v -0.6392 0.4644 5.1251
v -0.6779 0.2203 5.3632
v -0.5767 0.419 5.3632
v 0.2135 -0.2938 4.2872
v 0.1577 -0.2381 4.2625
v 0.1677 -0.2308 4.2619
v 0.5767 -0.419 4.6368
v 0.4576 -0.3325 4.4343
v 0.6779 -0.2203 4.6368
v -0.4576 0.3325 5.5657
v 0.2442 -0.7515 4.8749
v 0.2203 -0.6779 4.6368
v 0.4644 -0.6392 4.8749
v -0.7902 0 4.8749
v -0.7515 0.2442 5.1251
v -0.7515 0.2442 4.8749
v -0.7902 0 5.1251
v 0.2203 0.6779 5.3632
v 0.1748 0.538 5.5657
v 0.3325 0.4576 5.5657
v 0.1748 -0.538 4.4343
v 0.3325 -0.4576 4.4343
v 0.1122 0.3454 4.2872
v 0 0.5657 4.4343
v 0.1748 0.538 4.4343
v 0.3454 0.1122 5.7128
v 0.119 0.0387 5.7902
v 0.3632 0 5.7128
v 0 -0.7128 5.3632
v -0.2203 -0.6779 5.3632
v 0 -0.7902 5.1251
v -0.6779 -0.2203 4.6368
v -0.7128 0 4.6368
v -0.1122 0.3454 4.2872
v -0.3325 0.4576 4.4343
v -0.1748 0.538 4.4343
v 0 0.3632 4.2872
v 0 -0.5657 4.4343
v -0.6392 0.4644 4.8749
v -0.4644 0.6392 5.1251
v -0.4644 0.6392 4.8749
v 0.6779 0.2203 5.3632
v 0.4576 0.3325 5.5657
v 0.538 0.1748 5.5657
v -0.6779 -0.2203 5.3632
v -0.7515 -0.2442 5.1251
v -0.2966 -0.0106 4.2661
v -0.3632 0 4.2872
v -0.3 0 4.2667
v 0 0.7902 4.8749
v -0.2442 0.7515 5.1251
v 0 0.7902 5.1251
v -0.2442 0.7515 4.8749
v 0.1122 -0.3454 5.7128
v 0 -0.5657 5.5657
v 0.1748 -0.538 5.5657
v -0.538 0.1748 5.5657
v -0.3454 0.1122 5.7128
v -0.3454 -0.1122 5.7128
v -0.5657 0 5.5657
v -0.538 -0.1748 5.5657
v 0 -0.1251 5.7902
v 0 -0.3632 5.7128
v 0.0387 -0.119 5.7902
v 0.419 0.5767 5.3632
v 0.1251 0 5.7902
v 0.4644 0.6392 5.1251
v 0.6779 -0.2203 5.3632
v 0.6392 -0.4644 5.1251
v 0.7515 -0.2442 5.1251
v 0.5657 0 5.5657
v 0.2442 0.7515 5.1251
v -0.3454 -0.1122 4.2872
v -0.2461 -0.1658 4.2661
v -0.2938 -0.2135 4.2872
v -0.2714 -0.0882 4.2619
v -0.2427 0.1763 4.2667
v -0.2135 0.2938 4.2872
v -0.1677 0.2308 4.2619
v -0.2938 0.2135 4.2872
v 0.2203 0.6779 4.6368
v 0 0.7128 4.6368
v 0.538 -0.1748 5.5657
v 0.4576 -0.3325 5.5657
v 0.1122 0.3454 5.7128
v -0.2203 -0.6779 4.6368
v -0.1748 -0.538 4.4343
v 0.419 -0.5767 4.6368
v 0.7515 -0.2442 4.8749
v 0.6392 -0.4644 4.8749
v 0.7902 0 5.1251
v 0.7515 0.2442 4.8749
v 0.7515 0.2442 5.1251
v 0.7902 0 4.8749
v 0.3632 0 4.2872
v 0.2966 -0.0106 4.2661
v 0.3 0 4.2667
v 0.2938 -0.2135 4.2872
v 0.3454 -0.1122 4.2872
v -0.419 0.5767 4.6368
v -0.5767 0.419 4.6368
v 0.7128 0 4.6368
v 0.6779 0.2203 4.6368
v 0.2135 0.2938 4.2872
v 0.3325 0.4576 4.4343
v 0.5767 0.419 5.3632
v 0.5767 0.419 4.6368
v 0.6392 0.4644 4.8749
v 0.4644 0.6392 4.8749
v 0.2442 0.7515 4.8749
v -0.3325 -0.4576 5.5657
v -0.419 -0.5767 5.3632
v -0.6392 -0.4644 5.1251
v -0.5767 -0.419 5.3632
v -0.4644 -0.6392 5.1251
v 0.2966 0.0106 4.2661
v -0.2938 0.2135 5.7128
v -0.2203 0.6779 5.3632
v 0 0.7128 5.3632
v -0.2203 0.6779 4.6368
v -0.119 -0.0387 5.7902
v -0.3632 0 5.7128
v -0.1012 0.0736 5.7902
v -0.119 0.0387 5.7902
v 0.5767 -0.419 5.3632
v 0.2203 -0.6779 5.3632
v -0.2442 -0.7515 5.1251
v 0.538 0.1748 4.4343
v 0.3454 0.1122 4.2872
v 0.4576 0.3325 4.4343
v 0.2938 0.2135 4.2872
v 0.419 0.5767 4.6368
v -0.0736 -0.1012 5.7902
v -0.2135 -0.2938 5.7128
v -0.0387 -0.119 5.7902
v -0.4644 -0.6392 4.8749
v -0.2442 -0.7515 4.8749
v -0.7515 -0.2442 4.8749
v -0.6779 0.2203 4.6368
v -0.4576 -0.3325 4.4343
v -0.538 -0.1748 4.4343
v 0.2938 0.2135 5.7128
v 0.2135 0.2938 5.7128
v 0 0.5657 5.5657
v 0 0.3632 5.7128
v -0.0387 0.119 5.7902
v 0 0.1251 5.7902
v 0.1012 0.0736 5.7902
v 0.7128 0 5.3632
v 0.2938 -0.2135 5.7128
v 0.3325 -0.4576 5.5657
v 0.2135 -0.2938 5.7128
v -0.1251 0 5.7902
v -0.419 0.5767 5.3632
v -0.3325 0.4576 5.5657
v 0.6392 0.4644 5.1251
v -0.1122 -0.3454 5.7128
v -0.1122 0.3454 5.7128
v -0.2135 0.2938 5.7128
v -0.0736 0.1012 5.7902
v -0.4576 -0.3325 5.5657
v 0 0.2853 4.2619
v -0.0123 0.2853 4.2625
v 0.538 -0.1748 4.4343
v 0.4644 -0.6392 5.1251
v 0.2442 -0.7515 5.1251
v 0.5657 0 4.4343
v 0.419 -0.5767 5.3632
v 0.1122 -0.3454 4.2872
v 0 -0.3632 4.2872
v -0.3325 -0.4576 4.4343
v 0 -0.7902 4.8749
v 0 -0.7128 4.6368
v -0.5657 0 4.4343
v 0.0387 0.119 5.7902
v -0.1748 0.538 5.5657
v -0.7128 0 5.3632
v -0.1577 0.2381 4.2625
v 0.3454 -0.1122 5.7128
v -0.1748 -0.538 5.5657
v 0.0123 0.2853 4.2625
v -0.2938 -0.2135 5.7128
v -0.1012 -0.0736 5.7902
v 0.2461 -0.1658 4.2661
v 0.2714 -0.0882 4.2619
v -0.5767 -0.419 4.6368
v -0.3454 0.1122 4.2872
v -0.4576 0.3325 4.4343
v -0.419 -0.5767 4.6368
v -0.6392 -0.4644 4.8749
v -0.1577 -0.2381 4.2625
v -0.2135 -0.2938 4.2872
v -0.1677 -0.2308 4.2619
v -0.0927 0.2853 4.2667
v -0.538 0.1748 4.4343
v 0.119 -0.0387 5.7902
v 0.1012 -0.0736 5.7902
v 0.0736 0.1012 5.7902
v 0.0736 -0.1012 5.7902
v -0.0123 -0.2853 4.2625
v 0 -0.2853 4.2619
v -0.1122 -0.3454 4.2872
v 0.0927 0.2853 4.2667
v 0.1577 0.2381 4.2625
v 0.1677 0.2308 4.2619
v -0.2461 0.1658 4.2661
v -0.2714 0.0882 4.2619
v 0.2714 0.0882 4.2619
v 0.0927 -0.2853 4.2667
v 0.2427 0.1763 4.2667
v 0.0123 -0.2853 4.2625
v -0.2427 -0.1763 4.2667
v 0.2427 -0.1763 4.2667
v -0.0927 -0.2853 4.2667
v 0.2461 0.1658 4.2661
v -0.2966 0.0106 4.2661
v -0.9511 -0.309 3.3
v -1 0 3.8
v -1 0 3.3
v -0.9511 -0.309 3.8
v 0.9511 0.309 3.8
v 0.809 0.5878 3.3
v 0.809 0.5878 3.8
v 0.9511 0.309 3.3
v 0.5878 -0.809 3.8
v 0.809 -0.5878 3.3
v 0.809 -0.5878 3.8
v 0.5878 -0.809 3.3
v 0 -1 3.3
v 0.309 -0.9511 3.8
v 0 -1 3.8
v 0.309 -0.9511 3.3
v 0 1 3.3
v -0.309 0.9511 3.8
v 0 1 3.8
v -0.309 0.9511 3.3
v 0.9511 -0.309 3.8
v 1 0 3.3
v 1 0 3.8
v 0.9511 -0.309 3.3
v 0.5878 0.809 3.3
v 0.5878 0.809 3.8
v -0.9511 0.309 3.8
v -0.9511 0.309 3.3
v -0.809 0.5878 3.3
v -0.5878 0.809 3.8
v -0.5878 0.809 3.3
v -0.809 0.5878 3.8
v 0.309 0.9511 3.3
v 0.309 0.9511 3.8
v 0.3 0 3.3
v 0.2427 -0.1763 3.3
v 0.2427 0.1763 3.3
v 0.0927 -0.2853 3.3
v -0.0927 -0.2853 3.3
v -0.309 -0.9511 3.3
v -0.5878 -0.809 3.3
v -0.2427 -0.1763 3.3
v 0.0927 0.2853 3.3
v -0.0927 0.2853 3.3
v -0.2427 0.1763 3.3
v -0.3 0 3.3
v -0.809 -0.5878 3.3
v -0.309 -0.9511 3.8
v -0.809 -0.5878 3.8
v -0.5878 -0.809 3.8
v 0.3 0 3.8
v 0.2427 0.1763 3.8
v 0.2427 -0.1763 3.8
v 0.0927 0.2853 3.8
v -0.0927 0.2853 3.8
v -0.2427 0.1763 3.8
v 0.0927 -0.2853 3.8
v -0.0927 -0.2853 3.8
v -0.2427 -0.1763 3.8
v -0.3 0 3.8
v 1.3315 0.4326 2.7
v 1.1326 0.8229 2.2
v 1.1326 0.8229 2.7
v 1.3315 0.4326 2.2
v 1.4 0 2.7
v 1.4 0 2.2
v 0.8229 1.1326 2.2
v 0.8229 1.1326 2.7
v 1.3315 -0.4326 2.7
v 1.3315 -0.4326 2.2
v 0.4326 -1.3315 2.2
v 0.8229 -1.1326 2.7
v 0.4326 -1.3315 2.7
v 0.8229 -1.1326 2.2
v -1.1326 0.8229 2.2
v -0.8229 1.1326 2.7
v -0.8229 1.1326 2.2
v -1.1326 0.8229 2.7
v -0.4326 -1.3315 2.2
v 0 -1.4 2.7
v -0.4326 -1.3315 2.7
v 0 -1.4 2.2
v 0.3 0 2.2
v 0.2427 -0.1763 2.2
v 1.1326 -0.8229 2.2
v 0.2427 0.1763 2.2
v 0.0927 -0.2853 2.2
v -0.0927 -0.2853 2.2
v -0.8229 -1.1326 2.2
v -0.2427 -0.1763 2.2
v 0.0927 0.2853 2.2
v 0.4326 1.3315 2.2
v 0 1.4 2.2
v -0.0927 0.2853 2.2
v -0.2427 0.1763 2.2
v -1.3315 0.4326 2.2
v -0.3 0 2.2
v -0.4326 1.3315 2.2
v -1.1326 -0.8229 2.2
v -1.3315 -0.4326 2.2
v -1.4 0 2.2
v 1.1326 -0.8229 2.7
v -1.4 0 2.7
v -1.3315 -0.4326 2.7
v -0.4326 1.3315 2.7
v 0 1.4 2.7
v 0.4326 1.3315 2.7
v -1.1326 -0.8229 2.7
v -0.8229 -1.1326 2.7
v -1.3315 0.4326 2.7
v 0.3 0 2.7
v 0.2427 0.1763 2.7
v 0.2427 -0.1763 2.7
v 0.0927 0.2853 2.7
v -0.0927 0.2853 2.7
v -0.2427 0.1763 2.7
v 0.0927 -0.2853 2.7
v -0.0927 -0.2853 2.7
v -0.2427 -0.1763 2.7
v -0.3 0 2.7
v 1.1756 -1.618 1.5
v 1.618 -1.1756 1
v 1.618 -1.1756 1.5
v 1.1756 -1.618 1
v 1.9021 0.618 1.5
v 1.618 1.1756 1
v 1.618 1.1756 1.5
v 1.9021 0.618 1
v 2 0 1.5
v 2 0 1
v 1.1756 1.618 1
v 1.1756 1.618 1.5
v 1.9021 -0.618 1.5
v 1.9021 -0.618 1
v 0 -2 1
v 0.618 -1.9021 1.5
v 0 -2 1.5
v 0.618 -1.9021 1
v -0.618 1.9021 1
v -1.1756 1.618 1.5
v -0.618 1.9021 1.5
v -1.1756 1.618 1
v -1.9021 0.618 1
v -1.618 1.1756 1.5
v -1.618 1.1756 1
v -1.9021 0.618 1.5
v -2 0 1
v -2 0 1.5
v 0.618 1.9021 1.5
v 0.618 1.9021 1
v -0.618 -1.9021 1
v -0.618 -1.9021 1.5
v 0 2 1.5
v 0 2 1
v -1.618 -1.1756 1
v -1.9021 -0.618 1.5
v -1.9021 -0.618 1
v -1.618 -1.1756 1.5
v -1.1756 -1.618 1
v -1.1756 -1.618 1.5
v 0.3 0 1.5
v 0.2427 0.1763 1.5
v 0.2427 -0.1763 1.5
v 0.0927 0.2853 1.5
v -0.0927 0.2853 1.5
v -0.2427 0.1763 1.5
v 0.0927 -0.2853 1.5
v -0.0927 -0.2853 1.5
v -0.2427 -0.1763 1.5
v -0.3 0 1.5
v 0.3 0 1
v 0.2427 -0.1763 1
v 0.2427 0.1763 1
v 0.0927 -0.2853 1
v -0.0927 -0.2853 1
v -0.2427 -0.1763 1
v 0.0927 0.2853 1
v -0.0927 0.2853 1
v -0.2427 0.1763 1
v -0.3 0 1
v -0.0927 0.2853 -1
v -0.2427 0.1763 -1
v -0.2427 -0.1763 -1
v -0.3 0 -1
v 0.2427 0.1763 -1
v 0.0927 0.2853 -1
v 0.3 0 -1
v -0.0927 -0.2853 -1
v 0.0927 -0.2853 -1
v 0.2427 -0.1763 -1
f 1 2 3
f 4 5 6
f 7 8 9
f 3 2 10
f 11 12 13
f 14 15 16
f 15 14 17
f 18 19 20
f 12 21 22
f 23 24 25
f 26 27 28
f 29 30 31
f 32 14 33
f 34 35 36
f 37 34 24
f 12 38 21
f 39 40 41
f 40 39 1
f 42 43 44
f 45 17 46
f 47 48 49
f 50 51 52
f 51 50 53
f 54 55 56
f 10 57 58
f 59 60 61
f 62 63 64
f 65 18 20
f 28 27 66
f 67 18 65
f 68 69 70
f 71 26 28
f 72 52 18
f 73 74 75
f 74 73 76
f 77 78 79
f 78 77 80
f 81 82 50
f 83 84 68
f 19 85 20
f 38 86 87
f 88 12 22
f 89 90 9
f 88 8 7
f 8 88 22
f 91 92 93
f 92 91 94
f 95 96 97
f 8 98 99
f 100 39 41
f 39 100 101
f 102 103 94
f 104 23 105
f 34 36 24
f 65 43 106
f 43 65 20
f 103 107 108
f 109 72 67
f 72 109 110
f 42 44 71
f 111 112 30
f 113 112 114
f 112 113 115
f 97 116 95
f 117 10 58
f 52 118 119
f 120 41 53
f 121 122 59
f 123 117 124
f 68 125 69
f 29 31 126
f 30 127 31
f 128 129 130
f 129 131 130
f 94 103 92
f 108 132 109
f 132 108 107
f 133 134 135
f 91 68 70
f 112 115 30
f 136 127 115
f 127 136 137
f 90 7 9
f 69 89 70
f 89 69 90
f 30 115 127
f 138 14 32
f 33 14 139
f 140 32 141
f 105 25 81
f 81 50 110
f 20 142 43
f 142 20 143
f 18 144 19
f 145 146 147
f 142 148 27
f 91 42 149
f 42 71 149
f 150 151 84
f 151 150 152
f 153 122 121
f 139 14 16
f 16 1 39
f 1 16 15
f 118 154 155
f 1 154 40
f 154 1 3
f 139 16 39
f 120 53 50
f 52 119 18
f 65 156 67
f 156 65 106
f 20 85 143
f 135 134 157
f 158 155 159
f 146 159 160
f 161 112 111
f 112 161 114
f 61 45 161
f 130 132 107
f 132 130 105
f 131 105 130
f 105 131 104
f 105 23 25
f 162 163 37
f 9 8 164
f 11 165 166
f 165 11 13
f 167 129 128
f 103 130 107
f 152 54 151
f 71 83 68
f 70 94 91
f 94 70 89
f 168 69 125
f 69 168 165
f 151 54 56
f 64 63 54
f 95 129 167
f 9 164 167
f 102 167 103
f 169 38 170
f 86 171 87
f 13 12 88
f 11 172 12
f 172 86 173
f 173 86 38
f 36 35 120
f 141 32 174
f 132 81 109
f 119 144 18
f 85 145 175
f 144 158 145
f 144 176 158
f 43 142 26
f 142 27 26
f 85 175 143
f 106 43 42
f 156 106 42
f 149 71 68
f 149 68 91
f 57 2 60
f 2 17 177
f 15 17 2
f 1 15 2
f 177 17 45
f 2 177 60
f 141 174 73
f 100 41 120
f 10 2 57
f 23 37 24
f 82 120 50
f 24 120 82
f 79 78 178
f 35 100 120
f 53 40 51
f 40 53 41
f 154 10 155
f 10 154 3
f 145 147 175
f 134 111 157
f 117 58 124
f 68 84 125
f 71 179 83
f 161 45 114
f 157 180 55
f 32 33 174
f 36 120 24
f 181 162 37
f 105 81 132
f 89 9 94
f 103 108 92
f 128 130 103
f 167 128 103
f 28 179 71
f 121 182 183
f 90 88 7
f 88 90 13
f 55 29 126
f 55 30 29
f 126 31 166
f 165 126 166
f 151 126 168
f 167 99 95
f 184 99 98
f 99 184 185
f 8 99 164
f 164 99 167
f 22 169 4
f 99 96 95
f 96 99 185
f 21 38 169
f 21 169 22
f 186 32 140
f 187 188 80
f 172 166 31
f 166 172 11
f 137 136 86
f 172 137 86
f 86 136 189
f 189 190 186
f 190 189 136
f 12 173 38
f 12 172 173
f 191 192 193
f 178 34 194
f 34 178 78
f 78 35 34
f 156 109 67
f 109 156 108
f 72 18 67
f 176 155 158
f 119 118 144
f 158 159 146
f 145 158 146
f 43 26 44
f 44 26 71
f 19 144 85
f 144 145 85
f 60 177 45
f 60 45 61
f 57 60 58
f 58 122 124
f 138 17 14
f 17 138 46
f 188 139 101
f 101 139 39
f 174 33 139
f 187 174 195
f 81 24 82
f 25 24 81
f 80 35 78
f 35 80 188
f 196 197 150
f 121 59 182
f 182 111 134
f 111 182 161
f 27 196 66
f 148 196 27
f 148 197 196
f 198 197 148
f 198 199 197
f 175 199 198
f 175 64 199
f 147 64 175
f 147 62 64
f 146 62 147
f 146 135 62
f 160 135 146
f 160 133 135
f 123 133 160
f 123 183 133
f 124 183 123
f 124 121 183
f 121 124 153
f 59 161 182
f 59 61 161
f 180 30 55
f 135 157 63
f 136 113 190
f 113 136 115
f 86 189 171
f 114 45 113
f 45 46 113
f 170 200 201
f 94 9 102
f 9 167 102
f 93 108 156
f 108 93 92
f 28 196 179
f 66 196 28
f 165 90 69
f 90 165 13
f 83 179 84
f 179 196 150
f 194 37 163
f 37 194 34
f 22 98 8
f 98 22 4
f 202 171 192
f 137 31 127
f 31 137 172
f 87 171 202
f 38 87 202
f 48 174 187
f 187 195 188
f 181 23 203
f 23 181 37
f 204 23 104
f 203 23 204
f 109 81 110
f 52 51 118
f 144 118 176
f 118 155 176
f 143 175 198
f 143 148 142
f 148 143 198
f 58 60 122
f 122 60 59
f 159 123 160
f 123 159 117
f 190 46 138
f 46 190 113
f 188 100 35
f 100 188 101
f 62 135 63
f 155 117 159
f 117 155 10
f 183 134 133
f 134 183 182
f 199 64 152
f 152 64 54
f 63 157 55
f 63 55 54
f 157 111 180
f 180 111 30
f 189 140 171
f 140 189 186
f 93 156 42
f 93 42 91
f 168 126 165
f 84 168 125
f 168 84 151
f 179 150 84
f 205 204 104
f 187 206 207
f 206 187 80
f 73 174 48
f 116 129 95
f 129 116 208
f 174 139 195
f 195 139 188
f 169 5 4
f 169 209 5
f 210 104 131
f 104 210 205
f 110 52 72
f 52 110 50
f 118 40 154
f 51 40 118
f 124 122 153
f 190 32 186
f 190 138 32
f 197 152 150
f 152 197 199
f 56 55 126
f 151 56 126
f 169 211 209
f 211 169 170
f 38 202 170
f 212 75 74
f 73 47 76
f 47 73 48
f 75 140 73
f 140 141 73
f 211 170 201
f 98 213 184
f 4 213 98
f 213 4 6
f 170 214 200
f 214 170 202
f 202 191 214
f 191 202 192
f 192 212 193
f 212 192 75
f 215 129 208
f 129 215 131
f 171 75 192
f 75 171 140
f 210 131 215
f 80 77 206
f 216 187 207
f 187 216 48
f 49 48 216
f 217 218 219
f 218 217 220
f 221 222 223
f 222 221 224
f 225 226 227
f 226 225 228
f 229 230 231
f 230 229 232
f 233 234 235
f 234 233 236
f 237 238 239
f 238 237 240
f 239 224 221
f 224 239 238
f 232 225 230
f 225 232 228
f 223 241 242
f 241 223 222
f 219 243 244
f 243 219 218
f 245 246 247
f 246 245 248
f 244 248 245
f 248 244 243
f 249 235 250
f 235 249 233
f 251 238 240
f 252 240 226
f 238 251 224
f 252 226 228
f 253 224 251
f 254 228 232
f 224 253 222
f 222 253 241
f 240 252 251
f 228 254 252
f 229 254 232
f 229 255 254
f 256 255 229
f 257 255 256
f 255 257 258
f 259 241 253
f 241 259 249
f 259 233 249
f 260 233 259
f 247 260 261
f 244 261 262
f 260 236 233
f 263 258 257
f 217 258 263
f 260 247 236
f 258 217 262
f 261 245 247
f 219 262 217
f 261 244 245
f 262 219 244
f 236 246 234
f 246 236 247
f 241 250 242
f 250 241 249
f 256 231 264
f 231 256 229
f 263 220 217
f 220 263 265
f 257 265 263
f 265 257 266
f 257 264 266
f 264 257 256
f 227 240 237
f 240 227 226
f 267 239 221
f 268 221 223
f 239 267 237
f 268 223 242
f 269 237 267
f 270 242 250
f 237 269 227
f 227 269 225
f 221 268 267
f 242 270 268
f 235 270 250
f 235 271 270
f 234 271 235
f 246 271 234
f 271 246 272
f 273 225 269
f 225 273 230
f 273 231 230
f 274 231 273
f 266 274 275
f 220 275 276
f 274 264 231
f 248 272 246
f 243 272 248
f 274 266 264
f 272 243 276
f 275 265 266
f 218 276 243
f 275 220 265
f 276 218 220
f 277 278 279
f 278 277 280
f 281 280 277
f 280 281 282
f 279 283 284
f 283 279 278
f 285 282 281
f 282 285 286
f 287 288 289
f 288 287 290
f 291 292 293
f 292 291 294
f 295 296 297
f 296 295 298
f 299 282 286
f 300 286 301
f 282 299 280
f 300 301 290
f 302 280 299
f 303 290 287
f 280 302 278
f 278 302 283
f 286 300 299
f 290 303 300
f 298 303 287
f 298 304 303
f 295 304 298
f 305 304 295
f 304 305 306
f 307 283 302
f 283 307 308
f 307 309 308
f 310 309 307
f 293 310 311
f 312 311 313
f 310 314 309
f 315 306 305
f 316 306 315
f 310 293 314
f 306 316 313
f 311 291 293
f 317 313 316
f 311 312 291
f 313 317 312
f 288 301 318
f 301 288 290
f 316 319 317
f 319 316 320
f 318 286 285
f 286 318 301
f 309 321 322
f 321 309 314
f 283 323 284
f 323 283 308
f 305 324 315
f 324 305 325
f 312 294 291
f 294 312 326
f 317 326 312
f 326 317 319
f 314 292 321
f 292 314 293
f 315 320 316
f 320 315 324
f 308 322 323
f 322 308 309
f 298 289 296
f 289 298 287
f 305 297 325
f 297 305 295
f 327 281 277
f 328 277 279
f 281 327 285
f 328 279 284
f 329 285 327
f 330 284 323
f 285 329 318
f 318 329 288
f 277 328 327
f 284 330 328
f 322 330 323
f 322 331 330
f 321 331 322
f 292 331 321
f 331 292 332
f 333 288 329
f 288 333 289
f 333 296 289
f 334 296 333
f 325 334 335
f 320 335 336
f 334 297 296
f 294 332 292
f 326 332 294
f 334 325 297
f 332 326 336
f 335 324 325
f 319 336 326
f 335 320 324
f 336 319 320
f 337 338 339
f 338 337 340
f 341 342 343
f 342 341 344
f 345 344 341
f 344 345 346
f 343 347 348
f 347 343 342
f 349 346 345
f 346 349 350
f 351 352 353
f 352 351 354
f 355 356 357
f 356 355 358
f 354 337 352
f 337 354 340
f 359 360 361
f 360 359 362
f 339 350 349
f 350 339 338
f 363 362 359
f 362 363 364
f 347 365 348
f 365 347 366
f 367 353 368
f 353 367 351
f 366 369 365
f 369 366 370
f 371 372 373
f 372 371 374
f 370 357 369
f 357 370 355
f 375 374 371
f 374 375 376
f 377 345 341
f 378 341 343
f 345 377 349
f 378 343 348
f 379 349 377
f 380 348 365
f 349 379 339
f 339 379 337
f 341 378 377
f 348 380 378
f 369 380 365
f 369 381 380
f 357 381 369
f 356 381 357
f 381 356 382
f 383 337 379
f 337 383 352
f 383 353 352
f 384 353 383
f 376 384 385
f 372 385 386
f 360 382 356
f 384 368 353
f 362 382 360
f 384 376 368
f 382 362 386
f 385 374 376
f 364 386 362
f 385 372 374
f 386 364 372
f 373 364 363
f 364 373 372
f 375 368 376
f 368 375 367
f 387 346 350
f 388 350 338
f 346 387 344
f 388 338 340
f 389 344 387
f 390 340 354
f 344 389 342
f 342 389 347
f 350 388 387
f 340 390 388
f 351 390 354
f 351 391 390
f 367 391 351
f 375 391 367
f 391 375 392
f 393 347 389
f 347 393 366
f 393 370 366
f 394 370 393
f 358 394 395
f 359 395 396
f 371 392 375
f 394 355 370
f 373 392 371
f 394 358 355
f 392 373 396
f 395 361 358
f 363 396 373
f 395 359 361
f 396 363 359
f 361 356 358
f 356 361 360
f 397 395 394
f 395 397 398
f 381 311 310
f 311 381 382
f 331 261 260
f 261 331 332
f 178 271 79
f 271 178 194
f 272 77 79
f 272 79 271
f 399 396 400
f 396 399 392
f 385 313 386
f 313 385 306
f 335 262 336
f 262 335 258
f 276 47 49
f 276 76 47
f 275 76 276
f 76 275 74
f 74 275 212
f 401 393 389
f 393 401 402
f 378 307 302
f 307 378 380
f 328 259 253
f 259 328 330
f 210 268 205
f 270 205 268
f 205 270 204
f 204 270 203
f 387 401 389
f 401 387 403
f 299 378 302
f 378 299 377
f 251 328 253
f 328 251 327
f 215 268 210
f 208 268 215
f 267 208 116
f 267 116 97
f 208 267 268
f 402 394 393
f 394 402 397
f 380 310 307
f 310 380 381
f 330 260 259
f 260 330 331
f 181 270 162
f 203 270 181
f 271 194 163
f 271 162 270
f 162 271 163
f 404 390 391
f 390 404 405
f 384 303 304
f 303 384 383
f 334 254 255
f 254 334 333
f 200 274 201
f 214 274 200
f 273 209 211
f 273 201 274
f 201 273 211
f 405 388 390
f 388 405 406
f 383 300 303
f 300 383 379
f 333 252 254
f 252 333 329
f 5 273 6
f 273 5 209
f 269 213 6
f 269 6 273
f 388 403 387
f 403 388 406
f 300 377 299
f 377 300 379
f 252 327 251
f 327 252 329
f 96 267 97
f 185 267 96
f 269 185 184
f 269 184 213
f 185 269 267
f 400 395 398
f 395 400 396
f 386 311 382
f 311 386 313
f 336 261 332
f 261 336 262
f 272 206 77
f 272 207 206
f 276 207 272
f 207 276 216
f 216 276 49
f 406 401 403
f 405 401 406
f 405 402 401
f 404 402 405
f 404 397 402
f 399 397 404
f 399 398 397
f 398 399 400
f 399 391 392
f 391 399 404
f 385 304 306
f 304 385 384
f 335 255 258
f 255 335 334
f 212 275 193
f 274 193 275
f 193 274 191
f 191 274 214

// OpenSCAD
color("Yellow",0.5)
translate([0,0,5])
sphere(0.8,$fn=20);

color("LightGreen")
translate([0,0,3.3])
cylinder(0.5, 1, 1, $fn=20);

color("MediumSeaGreen")
translate([0,0,2.2])
cylinder(0.5, 1.4, 1.4, $fn=20);

color("DarkGreen")
translate([0,0,1])
cylinder(0.5, 2, 2, $fn=20);

color("Orange")
translate([0,0,-1])
cylinder(6, 0.3, 0.3, $fn=10);
